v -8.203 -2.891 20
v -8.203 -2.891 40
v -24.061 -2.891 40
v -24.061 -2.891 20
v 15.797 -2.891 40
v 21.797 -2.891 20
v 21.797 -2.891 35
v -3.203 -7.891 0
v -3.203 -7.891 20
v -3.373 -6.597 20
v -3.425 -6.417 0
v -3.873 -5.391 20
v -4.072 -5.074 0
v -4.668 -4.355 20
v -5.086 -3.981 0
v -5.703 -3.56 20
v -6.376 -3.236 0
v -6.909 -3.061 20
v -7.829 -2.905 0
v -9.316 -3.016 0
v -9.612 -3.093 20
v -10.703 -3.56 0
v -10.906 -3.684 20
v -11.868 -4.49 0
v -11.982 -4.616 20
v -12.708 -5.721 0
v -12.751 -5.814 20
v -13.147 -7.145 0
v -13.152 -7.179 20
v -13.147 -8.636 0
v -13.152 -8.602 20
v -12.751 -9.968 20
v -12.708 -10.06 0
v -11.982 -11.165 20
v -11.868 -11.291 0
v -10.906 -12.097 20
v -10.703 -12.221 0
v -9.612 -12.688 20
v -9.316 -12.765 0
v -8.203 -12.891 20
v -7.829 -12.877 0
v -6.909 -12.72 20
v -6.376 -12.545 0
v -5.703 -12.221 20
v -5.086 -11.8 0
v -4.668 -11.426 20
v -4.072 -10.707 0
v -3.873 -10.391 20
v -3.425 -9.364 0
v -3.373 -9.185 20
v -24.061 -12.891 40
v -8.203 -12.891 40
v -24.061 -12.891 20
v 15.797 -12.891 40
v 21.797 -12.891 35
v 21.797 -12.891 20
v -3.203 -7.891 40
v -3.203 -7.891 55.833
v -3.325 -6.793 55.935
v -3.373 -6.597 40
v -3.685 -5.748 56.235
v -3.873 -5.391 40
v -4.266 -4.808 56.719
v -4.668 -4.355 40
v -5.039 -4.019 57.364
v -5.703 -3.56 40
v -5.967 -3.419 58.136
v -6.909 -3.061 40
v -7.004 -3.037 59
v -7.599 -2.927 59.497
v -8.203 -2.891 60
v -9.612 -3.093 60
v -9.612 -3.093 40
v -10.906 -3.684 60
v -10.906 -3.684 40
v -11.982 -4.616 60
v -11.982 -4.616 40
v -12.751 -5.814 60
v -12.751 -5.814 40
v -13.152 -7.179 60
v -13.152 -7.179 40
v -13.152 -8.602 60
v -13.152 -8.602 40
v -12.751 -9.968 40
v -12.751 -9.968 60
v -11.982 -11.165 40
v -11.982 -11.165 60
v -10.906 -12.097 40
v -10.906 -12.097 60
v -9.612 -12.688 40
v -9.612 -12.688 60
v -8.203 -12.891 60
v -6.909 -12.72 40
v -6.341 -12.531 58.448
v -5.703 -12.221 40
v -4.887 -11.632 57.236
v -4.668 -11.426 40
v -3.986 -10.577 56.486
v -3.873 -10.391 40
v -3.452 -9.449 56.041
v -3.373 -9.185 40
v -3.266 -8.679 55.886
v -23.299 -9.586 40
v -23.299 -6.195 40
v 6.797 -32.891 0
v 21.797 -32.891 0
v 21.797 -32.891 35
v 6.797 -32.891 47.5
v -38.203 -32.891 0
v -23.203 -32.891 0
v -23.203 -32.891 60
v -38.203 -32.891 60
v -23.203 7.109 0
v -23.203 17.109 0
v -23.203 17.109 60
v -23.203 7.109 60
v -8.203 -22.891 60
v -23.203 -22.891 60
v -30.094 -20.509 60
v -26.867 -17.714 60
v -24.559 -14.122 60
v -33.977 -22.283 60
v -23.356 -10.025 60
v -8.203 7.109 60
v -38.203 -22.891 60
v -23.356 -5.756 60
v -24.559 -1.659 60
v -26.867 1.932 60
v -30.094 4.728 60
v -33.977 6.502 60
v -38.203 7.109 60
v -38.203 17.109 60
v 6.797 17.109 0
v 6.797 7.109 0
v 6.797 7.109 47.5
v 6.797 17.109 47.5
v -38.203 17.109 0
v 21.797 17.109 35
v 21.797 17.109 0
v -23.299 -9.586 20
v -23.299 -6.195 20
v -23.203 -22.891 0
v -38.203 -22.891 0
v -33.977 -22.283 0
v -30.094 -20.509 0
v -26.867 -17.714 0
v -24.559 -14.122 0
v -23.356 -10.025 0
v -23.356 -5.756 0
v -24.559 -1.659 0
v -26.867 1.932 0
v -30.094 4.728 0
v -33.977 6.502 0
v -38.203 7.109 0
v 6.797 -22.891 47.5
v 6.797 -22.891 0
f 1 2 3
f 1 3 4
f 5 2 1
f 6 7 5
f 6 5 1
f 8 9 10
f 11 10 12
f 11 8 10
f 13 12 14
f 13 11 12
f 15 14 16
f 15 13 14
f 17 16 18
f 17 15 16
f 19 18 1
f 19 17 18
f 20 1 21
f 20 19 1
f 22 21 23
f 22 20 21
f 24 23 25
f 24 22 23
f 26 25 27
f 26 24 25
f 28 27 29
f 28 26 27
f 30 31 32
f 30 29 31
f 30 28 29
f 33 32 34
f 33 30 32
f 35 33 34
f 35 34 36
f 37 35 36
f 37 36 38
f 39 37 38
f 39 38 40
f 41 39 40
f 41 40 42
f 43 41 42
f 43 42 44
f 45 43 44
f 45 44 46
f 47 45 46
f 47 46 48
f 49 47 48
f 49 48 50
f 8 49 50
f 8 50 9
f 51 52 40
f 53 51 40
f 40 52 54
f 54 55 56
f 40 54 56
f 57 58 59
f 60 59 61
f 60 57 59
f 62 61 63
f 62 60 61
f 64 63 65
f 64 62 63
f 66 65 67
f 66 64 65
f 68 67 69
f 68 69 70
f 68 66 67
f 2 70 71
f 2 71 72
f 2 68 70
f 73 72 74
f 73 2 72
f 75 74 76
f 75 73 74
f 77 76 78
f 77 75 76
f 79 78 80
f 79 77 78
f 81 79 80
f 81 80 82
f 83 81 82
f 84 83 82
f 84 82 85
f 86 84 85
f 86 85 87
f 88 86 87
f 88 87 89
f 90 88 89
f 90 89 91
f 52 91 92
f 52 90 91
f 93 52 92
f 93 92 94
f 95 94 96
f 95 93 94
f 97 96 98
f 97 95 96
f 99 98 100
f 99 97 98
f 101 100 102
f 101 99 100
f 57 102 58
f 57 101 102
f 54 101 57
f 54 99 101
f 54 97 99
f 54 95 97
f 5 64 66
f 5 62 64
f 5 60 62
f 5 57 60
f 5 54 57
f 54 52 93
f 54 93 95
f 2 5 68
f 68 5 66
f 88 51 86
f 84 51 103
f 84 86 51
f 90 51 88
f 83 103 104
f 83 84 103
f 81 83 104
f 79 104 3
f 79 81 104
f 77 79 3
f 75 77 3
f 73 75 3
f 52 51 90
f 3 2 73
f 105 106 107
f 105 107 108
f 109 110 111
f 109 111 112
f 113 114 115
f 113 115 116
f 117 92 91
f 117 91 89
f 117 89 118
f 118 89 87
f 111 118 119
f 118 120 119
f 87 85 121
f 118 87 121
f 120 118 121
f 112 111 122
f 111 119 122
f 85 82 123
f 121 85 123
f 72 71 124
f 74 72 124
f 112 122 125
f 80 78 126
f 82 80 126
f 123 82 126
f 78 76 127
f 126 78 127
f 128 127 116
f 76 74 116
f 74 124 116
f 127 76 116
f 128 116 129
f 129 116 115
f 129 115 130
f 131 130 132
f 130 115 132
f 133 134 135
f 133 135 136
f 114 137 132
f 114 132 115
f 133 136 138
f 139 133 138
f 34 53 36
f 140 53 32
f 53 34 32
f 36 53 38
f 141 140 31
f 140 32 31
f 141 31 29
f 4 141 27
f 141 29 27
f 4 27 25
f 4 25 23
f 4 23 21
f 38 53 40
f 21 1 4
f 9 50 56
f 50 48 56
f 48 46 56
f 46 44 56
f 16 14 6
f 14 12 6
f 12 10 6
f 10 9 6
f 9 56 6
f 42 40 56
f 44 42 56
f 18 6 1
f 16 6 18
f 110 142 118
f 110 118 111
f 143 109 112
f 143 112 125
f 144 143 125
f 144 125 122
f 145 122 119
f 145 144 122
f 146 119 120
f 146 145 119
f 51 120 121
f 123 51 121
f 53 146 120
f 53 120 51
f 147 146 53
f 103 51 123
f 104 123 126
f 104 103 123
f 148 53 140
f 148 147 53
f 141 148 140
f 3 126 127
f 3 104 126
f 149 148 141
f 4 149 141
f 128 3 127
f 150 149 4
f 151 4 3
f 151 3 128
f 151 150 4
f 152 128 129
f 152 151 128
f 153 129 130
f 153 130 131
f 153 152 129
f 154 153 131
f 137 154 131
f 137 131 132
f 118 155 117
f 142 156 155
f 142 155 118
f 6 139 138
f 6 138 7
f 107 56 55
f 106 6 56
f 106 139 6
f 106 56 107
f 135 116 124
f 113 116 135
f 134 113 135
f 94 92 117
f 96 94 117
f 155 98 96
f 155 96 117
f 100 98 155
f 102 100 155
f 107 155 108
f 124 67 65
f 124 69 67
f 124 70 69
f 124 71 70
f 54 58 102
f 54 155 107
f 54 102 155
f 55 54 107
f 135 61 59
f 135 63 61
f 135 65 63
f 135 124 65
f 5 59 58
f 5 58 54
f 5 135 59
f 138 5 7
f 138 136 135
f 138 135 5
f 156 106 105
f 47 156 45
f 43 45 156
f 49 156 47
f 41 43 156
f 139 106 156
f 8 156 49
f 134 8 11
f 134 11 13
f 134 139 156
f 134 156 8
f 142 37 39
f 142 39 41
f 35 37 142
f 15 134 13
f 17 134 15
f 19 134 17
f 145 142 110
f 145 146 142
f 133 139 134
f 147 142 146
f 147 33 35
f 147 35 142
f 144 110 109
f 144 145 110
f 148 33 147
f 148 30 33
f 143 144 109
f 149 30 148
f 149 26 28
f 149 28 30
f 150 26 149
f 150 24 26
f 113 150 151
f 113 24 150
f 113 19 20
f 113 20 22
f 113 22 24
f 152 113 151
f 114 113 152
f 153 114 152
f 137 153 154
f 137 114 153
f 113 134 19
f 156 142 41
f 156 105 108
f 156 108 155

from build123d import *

# Parameters (mm, degrees)
SKETCH1_R           = 5
BOSS_EXTRUDE1_DEPTH = 60
CUT_EXTRUDE3_DEPTH  = 60
SKETCH7_W           = 20
SKETCH7_H           = 10
CUT_EXTRUDE4_DEPTH  = 60


with BuildPart() as part:
    # Sketch1 → Boss-Extrude1 (new body)
    with BuildSketch(Plane.XY):
        with BuildLine():
            Line((-23.203125, -22.890625), (-23.203125, -32.890625))
            Line((-23.203125, -32.890625), (-38.203125, -32.890625))
            Line((-38.203125, -32.890625), (-38.203125, -22.890625))
            ThreePointArc((-38.203125, -22.890625), (-23.203125, -7.890625), (-38.203125, 7.109375))
            Line((-38.203125, 7.109375), (-38.203125, 17.109375))
            Line((-38.203125, 17.109375), (-23.203125, 17.109375))
            Line((-23.203125, 17.109375), (-23.203125, 7.109375))
            Line((-23.203125, 7.109375), (6.796875, 7.109375))
            Line((6.796875, 7.109375), (6.796875, 17.109375))
            Line((6.796875, 17.109375), (21.796875, 17.109375))
            Line((21.796875, 17.109375), (21.796875, -32.890625))
            Line((21.796875, -32.890625), (6.796875, -32.890625))
            Line((6.796875, -32.890625), (6.796875, -22.890625))
            Line((6.796875, -22.890625), (-23.203125, -22.890625))
        make_face()
        with Locations((-8.203125, -7.890625)):
            Circle(SKETCH1_R, mode=Mode.SUBTRACT)
    extrude(amount=BOSS_EXTRUDE1_DEPTH)

    # Sketch3 → Cut-Extrude3 (cut)
    with BuildSketch(Plane(origin=(0, 17.109375, 0), x_dir=(1, 0, 0), z_dir=(0, 1, 0))):
        Polygon((-8.203125, -60), (21.796875, -35), (21.796875, -60), align=None)
    extrude(amount=-CUT_EXTRUDE3_DEPTH, mode=Mode.SUBTRACT)

    # Sketch7 → Cut-Extrude4 (cut)
    with BuildSketch(Plane(origin=(21.796875, 0, 0), x_dir=(0, 0, -1), z_dir=(1, 0, 0))):
        with Locations((-30, -7.890625)):
            Rectangle(SKETCH7_W, SKETCH7_H)
    extrude(amount=-CUT_EXTRUDE4_DEPTH, mode=Mode.SUBTRACT)


solid = part.part
